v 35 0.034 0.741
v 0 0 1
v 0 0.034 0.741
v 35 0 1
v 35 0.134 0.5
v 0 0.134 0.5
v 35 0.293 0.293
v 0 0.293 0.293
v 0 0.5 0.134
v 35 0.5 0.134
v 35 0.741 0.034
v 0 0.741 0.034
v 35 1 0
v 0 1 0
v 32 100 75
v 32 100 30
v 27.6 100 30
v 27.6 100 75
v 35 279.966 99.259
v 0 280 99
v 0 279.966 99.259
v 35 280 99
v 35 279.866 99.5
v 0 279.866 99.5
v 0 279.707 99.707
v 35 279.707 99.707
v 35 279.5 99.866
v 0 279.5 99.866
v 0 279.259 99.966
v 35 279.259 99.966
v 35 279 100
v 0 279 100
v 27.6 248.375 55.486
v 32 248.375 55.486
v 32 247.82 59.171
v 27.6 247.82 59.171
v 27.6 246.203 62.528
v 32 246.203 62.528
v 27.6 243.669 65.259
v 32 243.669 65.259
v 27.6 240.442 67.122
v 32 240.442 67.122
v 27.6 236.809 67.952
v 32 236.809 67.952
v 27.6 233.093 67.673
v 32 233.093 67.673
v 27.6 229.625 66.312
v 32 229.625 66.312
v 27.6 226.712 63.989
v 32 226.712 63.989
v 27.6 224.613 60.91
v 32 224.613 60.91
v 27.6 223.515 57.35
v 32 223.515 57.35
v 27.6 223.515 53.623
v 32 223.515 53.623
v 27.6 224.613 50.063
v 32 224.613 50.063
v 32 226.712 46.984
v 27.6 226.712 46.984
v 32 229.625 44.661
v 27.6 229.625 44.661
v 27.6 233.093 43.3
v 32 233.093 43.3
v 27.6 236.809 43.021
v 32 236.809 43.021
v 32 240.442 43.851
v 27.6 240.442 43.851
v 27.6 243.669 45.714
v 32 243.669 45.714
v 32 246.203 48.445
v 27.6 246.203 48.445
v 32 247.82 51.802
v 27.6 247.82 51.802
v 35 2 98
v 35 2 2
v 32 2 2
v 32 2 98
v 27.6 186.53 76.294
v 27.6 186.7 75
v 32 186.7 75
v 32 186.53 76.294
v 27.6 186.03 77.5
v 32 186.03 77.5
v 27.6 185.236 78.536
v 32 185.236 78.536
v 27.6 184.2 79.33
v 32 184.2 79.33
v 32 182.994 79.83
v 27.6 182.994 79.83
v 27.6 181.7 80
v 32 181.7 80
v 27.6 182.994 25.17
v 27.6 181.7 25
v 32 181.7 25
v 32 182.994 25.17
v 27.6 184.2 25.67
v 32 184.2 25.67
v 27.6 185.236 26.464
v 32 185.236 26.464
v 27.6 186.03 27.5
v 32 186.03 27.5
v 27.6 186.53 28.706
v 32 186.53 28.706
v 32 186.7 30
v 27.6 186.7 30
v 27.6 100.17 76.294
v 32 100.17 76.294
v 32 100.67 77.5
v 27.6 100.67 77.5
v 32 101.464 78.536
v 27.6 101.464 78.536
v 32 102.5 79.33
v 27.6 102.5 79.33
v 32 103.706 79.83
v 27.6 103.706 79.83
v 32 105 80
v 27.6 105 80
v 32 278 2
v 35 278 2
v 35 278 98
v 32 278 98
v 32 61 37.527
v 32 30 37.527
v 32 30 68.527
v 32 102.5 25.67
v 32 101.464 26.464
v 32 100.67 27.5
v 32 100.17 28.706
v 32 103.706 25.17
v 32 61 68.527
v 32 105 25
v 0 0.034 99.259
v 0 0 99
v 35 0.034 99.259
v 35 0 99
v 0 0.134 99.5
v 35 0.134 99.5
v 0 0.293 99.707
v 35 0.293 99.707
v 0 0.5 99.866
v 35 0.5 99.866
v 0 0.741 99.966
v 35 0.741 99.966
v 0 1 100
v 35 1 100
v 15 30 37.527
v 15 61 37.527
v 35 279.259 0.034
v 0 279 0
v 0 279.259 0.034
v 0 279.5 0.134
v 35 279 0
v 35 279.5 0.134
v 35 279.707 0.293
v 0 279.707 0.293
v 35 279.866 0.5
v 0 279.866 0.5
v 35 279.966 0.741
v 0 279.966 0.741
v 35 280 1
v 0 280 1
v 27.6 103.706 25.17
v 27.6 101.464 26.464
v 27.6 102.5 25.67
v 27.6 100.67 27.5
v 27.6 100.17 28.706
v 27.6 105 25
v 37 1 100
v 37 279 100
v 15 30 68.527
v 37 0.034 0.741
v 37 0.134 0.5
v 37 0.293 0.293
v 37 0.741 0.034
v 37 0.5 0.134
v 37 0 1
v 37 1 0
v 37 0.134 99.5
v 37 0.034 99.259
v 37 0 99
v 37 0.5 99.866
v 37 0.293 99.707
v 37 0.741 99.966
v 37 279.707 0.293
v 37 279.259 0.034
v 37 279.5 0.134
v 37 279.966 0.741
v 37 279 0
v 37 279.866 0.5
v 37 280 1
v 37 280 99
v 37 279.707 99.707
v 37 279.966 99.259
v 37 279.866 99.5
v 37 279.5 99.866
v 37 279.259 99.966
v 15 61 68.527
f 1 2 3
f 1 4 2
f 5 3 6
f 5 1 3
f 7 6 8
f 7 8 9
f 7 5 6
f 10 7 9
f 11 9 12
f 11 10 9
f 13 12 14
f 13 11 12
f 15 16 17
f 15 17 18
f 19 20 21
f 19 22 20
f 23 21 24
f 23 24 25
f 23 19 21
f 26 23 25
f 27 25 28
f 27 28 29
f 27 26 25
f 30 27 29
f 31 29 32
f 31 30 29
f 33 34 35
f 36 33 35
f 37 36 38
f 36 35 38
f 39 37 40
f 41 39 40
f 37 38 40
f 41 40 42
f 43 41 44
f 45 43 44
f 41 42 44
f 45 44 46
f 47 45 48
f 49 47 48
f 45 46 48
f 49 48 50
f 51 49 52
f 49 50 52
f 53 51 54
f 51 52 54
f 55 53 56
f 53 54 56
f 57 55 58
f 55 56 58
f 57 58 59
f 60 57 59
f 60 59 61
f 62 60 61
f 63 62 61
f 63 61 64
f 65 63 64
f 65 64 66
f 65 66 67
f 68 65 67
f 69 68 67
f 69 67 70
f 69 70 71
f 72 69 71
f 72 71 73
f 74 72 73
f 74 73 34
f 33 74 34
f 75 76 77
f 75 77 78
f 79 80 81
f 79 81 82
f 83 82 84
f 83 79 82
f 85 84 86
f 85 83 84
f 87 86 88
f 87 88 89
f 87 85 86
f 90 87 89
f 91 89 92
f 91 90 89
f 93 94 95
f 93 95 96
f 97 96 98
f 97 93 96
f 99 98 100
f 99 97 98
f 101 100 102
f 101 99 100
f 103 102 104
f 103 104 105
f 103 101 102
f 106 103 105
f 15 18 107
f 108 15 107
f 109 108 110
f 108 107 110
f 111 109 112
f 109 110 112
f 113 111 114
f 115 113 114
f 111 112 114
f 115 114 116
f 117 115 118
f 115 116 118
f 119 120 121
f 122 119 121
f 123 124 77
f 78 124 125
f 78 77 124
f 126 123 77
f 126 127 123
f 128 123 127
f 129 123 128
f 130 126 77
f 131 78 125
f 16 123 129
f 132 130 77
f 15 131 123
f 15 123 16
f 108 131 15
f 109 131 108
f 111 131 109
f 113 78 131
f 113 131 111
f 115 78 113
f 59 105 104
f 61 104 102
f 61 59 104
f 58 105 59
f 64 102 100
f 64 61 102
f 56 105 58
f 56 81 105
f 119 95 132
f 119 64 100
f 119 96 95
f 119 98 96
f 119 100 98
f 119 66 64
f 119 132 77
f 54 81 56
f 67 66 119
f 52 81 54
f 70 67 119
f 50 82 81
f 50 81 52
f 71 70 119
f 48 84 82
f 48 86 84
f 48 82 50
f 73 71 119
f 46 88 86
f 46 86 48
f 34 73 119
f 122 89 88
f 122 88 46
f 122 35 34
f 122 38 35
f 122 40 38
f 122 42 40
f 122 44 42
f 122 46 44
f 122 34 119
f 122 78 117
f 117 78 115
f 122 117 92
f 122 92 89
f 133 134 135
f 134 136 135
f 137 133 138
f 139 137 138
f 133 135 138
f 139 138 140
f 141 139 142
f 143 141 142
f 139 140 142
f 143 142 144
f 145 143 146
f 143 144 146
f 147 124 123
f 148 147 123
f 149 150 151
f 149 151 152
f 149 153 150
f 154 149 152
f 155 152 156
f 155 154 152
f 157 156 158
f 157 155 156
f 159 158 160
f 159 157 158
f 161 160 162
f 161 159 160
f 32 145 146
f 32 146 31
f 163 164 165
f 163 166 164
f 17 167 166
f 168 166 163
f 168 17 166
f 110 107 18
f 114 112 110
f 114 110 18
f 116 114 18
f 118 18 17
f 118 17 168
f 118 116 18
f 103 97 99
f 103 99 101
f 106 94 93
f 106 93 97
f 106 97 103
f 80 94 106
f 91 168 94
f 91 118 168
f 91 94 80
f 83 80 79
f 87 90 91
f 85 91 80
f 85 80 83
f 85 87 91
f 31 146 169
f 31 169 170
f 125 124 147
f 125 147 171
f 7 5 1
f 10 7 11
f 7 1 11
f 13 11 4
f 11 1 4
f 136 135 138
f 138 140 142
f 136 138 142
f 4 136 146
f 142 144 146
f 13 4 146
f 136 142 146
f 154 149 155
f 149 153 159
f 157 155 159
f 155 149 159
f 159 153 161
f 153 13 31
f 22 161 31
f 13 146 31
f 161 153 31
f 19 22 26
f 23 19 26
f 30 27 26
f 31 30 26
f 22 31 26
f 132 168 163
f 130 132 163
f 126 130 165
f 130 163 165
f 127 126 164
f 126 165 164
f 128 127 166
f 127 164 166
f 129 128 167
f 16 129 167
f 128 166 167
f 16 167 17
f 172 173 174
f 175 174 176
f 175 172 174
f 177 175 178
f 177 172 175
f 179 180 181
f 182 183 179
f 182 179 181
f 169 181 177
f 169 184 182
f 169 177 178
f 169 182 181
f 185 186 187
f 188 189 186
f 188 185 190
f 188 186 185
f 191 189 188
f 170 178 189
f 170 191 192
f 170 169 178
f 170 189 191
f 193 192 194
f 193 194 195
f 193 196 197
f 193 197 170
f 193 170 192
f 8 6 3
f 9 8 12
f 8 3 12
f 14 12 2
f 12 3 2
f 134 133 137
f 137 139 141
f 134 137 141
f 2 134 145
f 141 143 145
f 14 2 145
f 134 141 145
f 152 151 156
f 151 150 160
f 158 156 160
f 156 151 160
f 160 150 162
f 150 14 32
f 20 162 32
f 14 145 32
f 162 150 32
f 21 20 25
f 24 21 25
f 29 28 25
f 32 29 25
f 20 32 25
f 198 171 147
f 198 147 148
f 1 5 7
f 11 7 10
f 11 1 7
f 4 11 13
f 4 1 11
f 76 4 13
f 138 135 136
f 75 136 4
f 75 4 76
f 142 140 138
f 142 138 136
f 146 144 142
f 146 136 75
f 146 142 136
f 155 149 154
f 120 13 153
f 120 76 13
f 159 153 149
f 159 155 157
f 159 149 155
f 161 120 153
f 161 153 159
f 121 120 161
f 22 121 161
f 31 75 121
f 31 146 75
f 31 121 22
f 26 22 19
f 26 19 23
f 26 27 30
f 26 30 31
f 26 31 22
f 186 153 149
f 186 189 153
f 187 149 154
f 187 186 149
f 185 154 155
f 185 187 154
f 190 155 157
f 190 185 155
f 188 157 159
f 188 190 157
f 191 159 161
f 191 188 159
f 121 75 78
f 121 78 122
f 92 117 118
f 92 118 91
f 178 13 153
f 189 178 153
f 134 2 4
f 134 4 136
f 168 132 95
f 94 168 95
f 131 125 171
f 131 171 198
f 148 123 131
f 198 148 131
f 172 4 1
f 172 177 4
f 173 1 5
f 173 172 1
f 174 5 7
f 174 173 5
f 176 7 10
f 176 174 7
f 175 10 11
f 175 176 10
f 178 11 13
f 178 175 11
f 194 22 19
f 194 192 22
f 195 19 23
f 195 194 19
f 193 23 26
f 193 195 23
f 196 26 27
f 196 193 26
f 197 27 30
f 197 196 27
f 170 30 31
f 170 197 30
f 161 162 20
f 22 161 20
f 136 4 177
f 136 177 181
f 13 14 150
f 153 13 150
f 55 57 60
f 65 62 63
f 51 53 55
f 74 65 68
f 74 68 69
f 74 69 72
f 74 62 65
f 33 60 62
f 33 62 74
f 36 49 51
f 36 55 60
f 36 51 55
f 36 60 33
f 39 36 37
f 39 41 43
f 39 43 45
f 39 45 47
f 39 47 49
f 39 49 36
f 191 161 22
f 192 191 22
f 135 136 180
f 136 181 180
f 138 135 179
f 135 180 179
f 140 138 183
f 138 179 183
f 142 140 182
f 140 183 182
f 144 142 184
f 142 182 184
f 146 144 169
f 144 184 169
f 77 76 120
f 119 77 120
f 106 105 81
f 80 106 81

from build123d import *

# Parameters (mm, degrees)
F0_W     = 280
F0_H     = 100
F1_DEPTH = 35
F2_DEPTH = 2
F3_R     = 1
F3_2_R   = 1
F4_W     = 31
F4_H     = 31
F4_W_2   = 86.7
F4_H_2   = 55
F4_R     = 12.5
F5_DEPTH = 20
F6_W     = 276
F6_H     = 96
F6_W_2   = 31
F6_H_2   = 31
F6_W_3   = 86.7
F6_H_3   = 55
F6_R     = 12.5
F7_DEPTH = 3
F8_R     = 5
F9_DEPTH = 12.6


with BuildPart() as f1:
    # F0 (on Right) → F1 (new body)
    with BuildSketch(Plane.YZ):
        with Locations((140, 50)):
            Rectangle(F0_W, F0_H)
    extrude(amount=F1_DEPTH)


with BuildPart() as f2:
    # F2 (new): a face of the model
    f2_faces = [f1.part.faces().sort_by_distance(p)[0] for p in [
        (35, 140, 50),
    ]]
    extrude(f2_faces, amount=F2_DEPTH)

    # F3#2
    f3_2_edges = [f2.edges().sort_by_distance(p)[0] for p in [
        (36, 280, 0),
        (36, 280, 100),
        (36, 0, 0),
        (36, 0, 100),
    ]]
    fillet(f3_2_edges, radius=F3_2_R)


with BuildPart() as f1_1:
    add(f1.part)

    # F3
    f3_edges = [f1_1.edges().sort_by_distance(p)[0] for p in [
        (17.5, 0, 100),
        (17.5, 0, 0),
        (17.5, 280, 0),
        (17.5, 280, 100),
    ]]
    fillet(f3_edges, radius=F3_R)

    # F4 (on face) → F5 (cut)
    with BuildSketch(Plane.YZ.offset(35)):
        with Locations((45.5, 53.0268381089)):
            Rectangle(F4_W, F4_H)
        with Locations((143.35, 52.5)):
            Rectangle(F4_W_2, F4_H_2)
        with Locations((235.8749031447, 55.4864800468)):
            Circle(F4_R)
    extrude(amount=-F5_DEPTH, mode=Mode.SUBTRACT)

    # F6 (on face) → F7 (cut)
    with BuildSketch(Plane.YZ.offset(35)):
        with Locations((140, 50)):
            Rectangle(F6_W, F6_H)
        with Locations((45.5, 53.0268381089)):
            Rectangle(F6_W_2, F6_H_2, mode=Mode.SUBTRACT)
        with Locations((143.35, 52.5)):
            Rectangle(F6_W_3, F6_H_3, mode=Mode.SUBTRACT)
        with Locations((235.8749031447, 55.4864800468)):
            Circle(F6_R, mode=Mode.SUBTRACT)
    extrude(amount=-F7_DEPTH, mode=Mode.SUBTRACT)

    # F8
    f8_edges = [f1_1.edges().sort_by_distance(p)[0] for p in [
        (23.5, 100, 80),
        (23.5, 186.7, 80),
        (23.5, 186.7, 25),
        (23.5, 100, 25),
    ]]
    fillet(f8_edges, radius=F8_R)

    # F9 (add): faces of the model
    f9_faces = [f1_1.faces().sort_by_distance(p)[0] for p in [
        (15, 143.35, 52.5),
        (15, 235.8749031447, 55.4864800468),
    ]]
    extrude(f9_faces, amount=F9_DEPTH)


solid = Compound([f2.part, f1_1.part])
